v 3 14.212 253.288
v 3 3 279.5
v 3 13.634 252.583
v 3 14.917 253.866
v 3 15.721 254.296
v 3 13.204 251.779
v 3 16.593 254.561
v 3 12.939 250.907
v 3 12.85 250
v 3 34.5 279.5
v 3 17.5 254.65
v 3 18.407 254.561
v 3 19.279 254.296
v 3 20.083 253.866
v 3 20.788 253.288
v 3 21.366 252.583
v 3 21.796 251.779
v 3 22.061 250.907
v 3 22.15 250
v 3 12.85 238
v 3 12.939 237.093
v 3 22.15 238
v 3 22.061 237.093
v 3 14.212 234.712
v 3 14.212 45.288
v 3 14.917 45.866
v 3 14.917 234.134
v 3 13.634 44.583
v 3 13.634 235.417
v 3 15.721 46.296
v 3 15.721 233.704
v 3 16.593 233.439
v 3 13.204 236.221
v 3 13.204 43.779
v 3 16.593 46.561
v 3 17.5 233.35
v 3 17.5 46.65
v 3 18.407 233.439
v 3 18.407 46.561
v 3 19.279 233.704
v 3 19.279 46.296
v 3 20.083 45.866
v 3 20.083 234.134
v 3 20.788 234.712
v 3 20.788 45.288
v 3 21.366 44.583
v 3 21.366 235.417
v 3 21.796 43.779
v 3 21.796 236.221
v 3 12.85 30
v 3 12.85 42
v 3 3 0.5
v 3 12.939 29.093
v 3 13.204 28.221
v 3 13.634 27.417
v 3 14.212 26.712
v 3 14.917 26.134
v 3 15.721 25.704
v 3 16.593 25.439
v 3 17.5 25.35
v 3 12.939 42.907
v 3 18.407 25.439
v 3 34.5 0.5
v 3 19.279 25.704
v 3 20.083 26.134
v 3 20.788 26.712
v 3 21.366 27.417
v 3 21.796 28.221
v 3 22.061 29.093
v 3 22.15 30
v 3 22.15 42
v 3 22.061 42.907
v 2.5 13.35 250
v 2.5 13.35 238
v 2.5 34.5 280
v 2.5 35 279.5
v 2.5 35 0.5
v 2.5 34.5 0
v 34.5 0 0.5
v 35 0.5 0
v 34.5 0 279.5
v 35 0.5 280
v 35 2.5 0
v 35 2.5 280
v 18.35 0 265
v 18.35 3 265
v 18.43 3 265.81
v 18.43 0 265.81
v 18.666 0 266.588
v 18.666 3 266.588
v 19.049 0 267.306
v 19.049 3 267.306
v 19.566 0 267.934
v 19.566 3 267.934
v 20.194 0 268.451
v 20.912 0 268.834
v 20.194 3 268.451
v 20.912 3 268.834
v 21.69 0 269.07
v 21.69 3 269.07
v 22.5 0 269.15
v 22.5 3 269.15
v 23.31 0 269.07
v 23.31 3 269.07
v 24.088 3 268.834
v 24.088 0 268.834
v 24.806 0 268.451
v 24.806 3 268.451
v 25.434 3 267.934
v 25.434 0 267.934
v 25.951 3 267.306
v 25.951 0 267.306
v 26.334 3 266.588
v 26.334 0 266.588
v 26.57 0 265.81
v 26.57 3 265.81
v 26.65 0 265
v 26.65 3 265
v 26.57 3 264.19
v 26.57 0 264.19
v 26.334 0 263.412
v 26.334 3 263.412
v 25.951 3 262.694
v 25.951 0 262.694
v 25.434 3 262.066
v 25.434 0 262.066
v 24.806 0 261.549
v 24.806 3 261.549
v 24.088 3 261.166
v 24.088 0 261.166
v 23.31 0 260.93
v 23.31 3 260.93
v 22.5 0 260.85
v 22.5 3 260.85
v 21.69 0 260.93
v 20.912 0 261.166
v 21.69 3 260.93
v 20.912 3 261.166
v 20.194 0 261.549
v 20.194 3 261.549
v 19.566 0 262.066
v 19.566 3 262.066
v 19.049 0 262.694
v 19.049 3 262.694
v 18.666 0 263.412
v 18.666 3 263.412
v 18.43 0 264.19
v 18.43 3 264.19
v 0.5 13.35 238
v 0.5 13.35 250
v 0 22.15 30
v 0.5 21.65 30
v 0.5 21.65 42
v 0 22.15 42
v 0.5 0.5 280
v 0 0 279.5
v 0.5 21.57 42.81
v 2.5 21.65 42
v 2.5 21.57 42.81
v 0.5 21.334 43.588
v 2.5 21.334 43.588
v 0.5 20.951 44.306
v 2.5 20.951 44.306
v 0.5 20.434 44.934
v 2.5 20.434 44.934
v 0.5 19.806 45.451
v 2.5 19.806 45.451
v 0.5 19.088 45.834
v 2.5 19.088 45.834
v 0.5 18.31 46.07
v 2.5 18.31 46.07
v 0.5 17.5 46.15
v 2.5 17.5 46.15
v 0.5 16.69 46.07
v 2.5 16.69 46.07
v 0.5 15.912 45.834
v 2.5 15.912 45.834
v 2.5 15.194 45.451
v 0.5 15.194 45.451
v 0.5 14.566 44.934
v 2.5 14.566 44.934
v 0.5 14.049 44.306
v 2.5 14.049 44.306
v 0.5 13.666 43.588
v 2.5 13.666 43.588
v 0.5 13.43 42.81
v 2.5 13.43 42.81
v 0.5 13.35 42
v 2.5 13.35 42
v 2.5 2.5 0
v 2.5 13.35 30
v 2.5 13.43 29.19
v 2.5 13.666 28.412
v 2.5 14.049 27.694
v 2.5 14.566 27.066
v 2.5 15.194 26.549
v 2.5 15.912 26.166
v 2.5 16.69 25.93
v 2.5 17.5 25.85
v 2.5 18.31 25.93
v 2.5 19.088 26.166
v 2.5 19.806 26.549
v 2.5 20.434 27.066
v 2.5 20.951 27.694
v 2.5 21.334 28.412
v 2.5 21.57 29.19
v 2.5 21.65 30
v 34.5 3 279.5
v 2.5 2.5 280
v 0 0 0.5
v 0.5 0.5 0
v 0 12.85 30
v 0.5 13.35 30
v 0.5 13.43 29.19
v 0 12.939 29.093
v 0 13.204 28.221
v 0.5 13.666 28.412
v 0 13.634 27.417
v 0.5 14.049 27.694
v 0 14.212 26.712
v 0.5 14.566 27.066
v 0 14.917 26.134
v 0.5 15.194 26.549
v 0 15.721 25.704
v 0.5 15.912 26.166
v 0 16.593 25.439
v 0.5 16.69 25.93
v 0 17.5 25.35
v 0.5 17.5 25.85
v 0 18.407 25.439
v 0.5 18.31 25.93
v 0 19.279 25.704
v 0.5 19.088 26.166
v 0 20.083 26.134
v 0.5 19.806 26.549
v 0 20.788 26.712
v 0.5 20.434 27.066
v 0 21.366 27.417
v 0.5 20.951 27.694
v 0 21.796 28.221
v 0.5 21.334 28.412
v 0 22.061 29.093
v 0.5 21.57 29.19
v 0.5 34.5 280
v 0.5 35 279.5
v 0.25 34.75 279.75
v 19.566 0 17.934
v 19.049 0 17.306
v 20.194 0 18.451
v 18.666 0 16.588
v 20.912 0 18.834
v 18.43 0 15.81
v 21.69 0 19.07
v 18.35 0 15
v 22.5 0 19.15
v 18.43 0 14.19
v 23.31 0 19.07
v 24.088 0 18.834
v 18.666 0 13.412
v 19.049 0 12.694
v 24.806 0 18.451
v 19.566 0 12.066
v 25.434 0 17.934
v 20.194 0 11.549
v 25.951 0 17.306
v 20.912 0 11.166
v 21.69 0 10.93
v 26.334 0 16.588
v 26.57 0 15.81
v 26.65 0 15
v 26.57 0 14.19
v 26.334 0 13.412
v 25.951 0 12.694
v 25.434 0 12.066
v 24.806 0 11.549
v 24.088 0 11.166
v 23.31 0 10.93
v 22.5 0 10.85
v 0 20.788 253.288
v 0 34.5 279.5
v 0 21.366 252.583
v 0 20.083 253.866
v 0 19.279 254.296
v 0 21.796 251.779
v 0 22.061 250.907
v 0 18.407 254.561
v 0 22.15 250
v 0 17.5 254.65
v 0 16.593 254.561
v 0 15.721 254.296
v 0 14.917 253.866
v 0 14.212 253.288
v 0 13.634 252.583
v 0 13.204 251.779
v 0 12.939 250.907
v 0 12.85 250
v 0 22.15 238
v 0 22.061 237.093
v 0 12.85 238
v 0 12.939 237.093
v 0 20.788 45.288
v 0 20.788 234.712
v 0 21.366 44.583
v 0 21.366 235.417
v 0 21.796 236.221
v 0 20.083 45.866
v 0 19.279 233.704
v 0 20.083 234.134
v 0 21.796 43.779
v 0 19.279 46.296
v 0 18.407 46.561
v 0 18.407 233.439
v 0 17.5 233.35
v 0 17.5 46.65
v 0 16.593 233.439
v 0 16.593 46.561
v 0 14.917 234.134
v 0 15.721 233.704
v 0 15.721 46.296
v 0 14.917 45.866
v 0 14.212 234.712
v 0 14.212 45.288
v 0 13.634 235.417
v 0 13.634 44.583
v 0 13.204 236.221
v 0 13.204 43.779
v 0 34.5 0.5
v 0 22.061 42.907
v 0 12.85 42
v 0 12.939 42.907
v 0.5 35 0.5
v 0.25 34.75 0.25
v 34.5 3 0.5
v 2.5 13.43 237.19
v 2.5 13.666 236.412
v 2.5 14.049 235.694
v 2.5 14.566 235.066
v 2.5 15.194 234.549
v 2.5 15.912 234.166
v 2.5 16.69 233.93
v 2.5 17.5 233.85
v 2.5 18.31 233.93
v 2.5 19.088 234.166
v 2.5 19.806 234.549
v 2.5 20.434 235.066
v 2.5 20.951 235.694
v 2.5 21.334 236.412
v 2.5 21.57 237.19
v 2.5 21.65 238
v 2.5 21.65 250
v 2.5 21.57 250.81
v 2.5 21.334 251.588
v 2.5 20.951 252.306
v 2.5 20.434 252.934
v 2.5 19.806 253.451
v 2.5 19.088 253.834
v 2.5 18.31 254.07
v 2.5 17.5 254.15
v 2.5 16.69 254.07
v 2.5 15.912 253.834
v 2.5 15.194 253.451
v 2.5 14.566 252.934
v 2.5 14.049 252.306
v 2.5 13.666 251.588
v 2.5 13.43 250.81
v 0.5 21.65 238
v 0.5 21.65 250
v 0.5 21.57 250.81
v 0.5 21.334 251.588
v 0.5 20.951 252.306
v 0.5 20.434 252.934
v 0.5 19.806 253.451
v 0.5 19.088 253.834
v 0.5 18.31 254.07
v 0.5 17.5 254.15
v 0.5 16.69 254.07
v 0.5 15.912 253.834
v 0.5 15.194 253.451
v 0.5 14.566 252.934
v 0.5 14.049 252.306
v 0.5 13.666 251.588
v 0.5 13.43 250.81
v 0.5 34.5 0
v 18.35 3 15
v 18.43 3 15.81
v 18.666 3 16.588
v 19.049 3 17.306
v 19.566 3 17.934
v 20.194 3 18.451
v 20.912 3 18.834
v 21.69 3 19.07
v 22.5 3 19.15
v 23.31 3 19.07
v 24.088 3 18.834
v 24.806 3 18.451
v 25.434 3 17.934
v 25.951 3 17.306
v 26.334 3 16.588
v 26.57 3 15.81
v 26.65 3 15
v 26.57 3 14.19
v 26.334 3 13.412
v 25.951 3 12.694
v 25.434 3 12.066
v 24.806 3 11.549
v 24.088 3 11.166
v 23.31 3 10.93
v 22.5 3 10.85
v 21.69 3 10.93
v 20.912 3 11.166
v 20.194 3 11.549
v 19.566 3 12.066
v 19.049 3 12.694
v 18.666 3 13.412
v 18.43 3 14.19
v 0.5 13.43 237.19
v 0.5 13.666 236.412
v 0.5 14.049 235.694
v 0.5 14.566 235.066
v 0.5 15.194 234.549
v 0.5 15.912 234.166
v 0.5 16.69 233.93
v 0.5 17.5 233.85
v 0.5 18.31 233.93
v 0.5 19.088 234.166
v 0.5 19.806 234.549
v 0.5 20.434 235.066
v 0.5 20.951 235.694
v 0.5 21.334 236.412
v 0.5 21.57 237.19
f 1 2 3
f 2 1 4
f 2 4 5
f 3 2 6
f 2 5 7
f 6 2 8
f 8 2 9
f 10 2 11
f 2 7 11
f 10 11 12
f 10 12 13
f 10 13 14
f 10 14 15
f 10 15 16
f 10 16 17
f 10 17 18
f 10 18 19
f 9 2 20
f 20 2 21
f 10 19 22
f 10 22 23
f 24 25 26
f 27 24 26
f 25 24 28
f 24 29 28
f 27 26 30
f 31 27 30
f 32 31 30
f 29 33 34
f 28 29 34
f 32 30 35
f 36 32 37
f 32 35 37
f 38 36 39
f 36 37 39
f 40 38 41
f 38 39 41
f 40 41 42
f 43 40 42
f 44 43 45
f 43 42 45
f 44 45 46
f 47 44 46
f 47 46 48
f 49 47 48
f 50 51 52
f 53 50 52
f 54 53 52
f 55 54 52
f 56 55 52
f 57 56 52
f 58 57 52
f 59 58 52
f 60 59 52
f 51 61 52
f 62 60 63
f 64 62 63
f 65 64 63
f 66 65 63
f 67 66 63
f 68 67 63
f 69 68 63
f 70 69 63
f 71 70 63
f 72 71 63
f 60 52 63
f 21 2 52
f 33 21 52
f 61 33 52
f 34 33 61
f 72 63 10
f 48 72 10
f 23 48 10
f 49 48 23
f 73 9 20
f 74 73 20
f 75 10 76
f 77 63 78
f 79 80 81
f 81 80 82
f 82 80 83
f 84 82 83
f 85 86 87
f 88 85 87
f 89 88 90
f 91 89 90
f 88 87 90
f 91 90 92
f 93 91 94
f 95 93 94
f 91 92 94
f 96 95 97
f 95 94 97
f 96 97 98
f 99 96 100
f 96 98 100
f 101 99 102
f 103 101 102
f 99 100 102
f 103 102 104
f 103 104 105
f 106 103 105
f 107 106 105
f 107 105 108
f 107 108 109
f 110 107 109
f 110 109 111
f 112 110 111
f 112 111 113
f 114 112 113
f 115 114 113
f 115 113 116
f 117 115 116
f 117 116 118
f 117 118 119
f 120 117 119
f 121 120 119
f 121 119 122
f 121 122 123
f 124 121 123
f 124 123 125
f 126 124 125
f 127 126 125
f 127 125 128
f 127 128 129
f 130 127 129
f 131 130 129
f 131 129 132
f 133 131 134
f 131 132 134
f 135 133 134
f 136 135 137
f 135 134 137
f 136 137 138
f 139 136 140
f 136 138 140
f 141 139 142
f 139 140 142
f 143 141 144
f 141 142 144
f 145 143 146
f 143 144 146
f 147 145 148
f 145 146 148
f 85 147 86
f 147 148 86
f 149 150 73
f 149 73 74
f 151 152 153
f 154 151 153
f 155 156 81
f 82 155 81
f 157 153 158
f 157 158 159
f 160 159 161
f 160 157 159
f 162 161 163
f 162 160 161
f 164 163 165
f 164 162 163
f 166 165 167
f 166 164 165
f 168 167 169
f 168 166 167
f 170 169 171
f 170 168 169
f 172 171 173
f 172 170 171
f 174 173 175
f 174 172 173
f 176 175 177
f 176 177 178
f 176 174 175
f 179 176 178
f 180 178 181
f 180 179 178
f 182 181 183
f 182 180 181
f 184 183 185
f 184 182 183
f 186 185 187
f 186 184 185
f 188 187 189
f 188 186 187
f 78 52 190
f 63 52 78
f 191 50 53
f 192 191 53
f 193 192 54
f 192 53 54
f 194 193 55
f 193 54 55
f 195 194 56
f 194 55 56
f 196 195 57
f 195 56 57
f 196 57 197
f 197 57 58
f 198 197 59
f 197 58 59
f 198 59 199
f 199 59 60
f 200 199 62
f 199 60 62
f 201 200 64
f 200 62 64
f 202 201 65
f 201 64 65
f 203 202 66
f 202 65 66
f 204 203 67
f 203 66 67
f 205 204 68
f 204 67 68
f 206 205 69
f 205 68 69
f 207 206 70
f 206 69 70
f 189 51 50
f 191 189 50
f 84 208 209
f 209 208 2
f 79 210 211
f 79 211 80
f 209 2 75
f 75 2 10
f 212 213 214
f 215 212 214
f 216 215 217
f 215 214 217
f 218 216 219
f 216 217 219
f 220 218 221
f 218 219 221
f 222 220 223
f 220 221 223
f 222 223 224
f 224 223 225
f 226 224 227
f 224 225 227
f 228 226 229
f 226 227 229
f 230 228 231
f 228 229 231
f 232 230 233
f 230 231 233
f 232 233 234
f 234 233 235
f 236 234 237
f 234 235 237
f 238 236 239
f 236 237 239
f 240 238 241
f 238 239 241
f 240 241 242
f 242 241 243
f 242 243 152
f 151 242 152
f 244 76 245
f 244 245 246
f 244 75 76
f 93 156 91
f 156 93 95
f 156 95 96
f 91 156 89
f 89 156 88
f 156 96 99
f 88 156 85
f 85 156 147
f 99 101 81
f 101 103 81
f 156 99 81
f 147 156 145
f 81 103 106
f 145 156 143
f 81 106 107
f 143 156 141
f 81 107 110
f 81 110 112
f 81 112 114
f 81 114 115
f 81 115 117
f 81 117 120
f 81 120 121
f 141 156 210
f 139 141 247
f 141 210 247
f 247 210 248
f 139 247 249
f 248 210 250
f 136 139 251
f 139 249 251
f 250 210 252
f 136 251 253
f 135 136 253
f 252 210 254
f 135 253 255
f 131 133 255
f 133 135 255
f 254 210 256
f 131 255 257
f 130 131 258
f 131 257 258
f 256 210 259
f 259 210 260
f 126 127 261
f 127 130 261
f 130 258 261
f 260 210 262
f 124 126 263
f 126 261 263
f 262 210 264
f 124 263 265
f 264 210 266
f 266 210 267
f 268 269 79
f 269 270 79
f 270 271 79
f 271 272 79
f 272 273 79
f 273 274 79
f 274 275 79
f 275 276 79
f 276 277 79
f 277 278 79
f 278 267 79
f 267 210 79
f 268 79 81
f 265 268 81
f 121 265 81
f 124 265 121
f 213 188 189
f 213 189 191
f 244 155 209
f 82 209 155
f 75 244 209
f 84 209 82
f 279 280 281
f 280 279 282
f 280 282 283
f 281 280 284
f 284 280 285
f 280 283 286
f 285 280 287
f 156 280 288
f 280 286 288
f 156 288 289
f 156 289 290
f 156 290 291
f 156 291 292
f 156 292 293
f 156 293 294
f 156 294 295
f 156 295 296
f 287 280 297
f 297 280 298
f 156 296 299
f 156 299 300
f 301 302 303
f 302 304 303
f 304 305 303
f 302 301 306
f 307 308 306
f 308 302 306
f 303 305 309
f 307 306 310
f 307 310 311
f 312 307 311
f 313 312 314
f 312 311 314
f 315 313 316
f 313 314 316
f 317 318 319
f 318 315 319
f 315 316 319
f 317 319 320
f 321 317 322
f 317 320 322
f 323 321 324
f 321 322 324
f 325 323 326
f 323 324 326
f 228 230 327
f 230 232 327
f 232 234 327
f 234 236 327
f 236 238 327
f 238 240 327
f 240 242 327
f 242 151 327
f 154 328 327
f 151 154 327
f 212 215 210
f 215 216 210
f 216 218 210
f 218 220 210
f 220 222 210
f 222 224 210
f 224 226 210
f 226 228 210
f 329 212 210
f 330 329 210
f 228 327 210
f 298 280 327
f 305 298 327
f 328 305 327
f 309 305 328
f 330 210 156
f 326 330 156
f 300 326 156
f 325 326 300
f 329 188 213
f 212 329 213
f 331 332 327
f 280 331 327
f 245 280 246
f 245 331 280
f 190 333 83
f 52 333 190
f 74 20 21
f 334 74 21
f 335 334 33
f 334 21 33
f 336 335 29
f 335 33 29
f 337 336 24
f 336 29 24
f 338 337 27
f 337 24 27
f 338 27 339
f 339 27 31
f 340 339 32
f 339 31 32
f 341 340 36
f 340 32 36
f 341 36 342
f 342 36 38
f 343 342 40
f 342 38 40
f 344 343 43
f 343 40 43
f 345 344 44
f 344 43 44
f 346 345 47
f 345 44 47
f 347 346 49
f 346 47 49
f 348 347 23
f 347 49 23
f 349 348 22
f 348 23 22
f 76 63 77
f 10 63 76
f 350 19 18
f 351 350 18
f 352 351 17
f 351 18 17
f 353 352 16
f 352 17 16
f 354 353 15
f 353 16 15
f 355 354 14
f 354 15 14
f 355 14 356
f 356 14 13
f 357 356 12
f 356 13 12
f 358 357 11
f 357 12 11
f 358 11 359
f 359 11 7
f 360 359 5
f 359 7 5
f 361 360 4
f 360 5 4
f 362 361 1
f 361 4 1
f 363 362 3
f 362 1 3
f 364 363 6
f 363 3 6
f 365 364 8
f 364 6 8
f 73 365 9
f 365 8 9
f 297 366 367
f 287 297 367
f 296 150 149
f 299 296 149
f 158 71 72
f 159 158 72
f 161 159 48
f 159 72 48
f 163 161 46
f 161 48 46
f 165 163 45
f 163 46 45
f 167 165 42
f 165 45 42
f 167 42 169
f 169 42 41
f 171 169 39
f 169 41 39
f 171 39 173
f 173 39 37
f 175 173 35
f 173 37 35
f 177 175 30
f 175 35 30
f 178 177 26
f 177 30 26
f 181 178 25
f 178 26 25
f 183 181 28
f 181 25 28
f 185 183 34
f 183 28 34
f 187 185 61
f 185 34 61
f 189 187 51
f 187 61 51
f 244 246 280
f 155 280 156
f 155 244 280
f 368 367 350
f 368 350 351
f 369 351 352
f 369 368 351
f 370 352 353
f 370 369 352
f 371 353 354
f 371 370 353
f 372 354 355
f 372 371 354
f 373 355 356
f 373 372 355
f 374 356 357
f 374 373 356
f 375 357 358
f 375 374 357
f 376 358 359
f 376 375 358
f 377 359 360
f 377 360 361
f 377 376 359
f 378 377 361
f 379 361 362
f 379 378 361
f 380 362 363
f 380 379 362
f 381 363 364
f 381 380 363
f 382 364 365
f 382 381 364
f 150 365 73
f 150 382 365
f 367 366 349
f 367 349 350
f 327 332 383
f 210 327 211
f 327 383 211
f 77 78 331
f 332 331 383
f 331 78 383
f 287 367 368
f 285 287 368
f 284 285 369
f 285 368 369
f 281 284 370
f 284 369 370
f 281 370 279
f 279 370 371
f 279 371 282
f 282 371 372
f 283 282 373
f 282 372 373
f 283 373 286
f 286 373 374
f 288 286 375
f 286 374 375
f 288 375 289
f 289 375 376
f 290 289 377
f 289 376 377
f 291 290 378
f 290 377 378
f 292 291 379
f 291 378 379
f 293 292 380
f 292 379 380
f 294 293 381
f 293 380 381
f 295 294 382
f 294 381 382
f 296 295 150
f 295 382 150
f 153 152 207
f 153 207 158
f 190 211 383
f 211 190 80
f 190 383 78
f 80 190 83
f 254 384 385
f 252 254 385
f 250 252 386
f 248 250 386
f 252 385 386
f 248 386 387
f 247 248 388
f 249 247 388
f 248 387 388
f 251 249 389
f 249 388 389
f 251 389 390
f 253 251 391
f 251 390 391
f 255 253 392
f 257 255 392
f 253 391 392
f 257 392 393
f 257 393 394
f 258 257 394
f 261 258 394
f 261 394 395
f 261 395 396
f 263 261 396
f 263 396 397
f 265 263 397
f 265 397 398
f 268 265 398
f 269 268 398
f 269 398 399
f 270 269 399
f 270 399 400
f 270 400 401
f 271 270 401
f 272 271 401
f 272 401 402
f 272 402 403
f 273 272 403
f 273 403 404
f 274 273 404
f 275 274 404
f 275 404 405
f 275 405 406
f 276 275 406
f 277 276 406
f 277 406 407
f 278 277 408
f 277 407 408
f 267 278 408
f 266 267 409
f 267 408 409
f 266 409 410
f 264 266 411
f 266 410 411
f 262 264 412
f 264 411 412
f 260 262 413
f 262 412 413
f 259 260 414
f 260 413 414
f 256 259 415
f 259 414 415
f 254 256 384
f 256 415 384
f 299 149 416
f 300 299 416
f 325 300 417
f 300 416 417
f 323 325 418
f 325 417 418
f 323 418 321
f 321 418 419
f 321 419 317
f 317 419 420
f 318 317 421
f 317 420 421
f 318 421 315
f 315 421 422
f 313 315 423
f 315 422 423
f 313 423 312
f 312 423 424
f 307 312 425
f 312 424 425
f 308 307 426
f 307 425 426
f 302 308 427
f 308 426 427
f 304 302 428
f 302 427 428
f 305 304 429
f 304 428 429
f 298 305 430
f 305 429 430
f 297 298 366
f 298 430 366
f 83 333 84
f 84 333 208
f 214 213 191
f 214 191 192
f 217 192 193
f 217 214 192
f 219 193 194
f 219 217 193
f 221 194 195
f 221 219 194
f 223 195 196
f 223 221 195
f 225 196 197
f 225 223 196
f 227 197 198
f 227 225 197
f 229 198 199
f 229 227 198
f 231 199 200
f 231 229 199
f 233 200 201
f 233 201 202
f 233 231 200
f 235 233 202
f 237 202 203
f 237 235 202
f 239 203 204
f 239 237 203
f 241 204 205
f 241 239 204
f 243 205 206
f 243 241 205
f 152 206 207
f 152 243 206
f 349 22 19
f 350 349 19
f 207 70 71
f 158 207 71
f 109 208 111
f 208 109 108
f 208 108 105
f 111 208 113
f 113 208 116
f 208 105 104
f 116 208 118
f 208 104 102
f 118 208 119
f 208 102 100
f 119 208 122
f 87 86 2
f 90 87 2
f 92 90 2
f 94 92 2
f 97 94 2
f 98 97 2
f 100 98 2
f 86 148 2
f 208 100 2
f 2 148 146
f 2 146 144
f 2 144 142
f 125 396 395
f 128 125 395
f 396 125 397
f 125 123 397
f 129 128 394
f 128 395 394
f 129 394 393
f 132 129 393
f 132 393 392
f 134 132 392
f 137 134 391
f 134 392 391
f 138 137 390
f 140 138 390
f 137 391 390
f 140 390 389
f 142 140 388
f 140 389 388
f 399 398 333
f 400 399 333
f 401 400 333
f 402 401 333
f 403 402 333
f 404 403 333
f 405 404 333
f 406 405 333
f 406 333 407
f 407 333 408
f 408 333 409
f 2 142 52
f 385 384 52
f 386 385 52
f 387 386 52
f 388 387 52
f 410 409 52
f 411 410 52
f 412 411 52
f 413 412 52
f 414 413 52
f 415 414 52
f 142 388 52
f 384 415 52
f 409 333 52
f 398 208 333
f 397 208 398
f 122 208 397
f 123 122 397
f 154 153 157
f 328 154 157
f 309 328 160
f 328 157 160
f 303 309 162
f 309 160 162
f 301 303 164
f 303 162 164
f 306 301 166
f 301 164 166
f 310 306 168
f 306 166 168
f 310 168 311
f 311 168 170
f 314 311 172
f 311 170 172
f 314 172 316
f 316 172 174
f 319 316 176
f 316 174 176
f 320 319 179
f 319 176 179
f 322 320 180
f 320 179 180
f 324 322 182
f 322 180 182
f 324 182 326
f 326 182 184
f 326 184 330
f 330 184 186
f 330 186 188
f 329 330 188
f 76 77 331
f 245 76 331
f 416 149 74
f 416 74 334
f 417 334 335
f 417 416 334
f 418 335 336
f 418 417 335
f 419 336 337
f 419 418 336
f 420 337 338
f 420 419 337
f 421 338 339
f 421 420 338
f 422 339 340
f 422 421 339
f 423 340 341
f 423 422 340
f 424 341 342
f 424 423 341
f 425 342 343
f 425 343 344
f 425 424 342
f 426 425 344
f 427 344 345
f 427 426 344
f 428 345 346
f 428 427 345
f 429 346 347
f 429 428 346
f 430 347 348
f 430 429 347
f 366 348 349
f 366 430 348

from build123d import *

# Parameters (mm, degrees)
P_IDAT_VYSUNUT_M1_DEPTH  = 280
ODEBRAT_VYSUNUT_M1_DEPTH = 4
SKICA3_R                 = 4.15
ODEBRAT_VYSUNUT_M2_DEPTH = 4
ZKOSEN_1_SIZE            = 0.5
ZKOSEN_2_SIZE            = 0.5


with BuildPart() as part:
    # Skica1 → Přidat vysunutím1 (new body)
    with BuildSketch(Plane.XY):
        Polygon((0, 35), (0, 0), (35, 0), (35, 3), (3, 3), (3, 35), align=None)
    extrude(amount=P_IDAT_VYSUNUT_M1_DEPTH)

    # Skica2 → Odebrat vysunutím1 (cut)
    with BuildSketch(Plane.ZY):
        with BuildLine():
            Line((30, 21.65), (42, 21.65))
            ThreePointArc((42, 21.65), (46.15, 17.5), (42, 13.35))
            Line((42, 13.35), (30, 13.35))
            ThreePointArc((30, 13.35), (25.85, 17.5), (30, 21.65))
        make_face()
        with BuildLine():
            Line((238, 21.65), (250, 21.65))
            ThreePointArc((250, 21.65), (254.15, 17.5), (250, 13.35))
            Line((250, 13.35), (238, 13.35))
            ThreePointArc((238, 13.35), (233.85, 17.5), (238, 21.65))
        make_face()
    extrude(amount=-ODEBRAT_VYSUNUT_M1_DEPTH, mode=Mode.SUBTRACT)

    # Skica3 → Odebrat vysunutím2 (cut)
    with BuildSketch(Plane(origin=(0, 3, 0), x_dir=(-1, 0, 0), z_dir=(0, 1, 0))):
        with Locations((-22.5, 265)):
            Circle(SKICA3_R)
        with Locations((-22.5, 15)):
            Circle(SKICA3_R)
    extrude(amount=-ODEBRAT_VYSUNUT_M2_DEPTH, mode=Mode.SUBTRACT)

    # Zkosení1
    zkosen_1_edges = [part.edges().sort_by_distance(p)[0] for p in [
        (17.5, 0, 280),
        (3, 35, 140),
        (35, 3, 140),
        (35, 0, 140),
        (19, 3, 280),
        (3, 13.35, 36),
        (3, 19, 280),
        (3, 17.5, 46.15),
        (3, 21.65, 36),
        (3, 17.5, 25.85),
        (0, 17.5, 25.85),
        (0, 13.35, 36),
        (0, 17.5, 46.15),
        (0, 21.65, 36),
        (3, 13.35, 244),
        (3, 17.5, 254.15),
        (3, 21.65, 244),
        (3, 17.5, 233.85),
        (1.5, 35, 280),
        (0, 17.5, 233.85),
        (0, 13.35, 244),
        (0, 17.5, 254.15),
        (0, 21.65, 244),
        (3, 19, 0),
        (19, 3, 0),
        (0, 17.5, 280),
        (17.5, 0, 0),
        (0, 17.5, 0),
        (1.5, 35, 0),
    ]]
    chamfer(zkosen_1_edges, length=ZKOSEN_1_SIZE)

    # Zkosení2
    zkosen_2_edges = [part.edges().sort_by_distance(p)[0] for p in [
        (0, 35, 140),
    ]]
    chamfer(zkosen_2_edges, length=ZKOSEN_2_SIZE)


solid = part.part
